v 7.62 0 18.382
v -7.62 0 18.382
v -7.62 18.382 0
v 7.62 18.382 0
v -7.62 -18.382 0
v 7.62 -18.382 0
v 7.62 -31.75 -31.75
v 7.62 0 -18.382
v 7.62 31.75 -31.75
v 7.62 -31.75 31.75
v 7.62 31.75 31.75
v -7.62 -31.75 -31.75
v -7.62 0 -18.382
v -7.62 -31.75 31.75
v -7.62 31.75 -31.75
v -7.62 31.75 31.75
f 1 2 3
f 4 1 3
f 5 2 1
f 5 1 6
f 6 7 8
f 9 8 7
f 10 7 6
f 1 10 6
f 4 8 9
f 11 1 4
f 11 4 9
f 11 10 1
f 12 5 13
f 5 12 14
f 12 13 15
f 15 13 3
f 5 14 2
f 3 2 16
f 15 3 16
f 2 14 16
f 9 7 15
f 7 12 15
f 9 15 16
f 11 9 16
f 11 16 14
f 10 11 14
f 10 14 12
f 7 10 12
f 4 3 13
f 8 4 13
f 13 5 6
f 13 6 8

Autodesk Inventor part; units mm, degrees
ref_plane "YZ Plane" through (0, 0, 0) normal (1, 0, 0) x (0, 1, 0)
ref_plane "XZ Plane" through (0, 0, 0) normal (0, 1, 0) x (-1, 0, 0)
ref_plane "XY Plane" through (0, 0, 0) normal (0, 0, 1) x (1, 0, 0)
sketch "Sketch1" plane through (0, 0, 0) normal (1, 0, 0) x (0, 1, 0)
  line L0 (0, 17.9605) -> (17.9605, 0) construction
  line L1 (17.9605, 0) -> (0, -17.9605) construction
  line L2 (0, -17.9605) -> (-17.9605, 0) construction
  line L3 (-17.9605, 0) -> (0, 17.9605) construction
  line L4 (0, 17.9605) -> (0, -17.9605) construction
  line L5 (17.9605, 0) -> (-17.9605, 0) construction
  line L6 (0, 18.3816) -> (-18.3816, 0)
  line L7 (0, 18.3816) -> (18.3816, 0)
  line L8 (18.3816, 0) -> (0, -18.3816)
  line L9 (-18.3816, 0) -> (0, -18.3816)
  line L10 (0, 25.5658) -> (-25.5658, 0)
  line L11 (-25.5658, 0) -> (0, -25.5658)
  line L12 (0, -25.5658) -> (25.5658, 0)
  line L13 (25.5658, 0) -> (0, 25.5658)
  line L14 (-44.45, 0) -> (44.45, 0) projected
  line L15 (0, -44.45) -> (0, 44.45) projected
  line L16 (31.75, 31.75) -> (-31.75, 31.75)
  line L17 (-31.75, 31.75) -> (-31.75, -31.75)
  line L18 (-31.75, -31.75) -> (31.75, -31.75)
  line L19 (31.75, -31.75) -> (31.75, 31.75)
  line L20 (31.75, 31.75) -> (-31.75, -31.75) construction
  line L21 (-31.75, 31.75) -> (31.75, -31.75) construction
  point P0 (0, 0)
  point P1 (0, 0)
  point P2 (0, 0)
  point P3 (0, 0)
  point P4 (29.7157, 21.8287)
  point P5 (0, 0)
  dimension "d0" = 25.4
  dimension "d1" = 25.4
  dimension "d3" = 5.08
  dimension "d4" = 5.08
  dimension "d7" = 63.5
  dimension "d8" = 63.5
extrude "Extrusion1" add sketch "Sketch1" along normal mid plane 15.24 contours L15 L13 L14 L7 | L6 L14 L10 L15 | L9 L15 L11 L14 | L14 L12 L15 L8 | L15 L16 L19 L14 L13 | L10 L14 L17 L16 L15 | L11 L15 L18 L17 L14 | L14 L19 L18 L15 L12
equation "\"d4\" = d3"
equation "\"d8\" = d7"
properties part number "y_axis_mount" material "ABS Plastic"
